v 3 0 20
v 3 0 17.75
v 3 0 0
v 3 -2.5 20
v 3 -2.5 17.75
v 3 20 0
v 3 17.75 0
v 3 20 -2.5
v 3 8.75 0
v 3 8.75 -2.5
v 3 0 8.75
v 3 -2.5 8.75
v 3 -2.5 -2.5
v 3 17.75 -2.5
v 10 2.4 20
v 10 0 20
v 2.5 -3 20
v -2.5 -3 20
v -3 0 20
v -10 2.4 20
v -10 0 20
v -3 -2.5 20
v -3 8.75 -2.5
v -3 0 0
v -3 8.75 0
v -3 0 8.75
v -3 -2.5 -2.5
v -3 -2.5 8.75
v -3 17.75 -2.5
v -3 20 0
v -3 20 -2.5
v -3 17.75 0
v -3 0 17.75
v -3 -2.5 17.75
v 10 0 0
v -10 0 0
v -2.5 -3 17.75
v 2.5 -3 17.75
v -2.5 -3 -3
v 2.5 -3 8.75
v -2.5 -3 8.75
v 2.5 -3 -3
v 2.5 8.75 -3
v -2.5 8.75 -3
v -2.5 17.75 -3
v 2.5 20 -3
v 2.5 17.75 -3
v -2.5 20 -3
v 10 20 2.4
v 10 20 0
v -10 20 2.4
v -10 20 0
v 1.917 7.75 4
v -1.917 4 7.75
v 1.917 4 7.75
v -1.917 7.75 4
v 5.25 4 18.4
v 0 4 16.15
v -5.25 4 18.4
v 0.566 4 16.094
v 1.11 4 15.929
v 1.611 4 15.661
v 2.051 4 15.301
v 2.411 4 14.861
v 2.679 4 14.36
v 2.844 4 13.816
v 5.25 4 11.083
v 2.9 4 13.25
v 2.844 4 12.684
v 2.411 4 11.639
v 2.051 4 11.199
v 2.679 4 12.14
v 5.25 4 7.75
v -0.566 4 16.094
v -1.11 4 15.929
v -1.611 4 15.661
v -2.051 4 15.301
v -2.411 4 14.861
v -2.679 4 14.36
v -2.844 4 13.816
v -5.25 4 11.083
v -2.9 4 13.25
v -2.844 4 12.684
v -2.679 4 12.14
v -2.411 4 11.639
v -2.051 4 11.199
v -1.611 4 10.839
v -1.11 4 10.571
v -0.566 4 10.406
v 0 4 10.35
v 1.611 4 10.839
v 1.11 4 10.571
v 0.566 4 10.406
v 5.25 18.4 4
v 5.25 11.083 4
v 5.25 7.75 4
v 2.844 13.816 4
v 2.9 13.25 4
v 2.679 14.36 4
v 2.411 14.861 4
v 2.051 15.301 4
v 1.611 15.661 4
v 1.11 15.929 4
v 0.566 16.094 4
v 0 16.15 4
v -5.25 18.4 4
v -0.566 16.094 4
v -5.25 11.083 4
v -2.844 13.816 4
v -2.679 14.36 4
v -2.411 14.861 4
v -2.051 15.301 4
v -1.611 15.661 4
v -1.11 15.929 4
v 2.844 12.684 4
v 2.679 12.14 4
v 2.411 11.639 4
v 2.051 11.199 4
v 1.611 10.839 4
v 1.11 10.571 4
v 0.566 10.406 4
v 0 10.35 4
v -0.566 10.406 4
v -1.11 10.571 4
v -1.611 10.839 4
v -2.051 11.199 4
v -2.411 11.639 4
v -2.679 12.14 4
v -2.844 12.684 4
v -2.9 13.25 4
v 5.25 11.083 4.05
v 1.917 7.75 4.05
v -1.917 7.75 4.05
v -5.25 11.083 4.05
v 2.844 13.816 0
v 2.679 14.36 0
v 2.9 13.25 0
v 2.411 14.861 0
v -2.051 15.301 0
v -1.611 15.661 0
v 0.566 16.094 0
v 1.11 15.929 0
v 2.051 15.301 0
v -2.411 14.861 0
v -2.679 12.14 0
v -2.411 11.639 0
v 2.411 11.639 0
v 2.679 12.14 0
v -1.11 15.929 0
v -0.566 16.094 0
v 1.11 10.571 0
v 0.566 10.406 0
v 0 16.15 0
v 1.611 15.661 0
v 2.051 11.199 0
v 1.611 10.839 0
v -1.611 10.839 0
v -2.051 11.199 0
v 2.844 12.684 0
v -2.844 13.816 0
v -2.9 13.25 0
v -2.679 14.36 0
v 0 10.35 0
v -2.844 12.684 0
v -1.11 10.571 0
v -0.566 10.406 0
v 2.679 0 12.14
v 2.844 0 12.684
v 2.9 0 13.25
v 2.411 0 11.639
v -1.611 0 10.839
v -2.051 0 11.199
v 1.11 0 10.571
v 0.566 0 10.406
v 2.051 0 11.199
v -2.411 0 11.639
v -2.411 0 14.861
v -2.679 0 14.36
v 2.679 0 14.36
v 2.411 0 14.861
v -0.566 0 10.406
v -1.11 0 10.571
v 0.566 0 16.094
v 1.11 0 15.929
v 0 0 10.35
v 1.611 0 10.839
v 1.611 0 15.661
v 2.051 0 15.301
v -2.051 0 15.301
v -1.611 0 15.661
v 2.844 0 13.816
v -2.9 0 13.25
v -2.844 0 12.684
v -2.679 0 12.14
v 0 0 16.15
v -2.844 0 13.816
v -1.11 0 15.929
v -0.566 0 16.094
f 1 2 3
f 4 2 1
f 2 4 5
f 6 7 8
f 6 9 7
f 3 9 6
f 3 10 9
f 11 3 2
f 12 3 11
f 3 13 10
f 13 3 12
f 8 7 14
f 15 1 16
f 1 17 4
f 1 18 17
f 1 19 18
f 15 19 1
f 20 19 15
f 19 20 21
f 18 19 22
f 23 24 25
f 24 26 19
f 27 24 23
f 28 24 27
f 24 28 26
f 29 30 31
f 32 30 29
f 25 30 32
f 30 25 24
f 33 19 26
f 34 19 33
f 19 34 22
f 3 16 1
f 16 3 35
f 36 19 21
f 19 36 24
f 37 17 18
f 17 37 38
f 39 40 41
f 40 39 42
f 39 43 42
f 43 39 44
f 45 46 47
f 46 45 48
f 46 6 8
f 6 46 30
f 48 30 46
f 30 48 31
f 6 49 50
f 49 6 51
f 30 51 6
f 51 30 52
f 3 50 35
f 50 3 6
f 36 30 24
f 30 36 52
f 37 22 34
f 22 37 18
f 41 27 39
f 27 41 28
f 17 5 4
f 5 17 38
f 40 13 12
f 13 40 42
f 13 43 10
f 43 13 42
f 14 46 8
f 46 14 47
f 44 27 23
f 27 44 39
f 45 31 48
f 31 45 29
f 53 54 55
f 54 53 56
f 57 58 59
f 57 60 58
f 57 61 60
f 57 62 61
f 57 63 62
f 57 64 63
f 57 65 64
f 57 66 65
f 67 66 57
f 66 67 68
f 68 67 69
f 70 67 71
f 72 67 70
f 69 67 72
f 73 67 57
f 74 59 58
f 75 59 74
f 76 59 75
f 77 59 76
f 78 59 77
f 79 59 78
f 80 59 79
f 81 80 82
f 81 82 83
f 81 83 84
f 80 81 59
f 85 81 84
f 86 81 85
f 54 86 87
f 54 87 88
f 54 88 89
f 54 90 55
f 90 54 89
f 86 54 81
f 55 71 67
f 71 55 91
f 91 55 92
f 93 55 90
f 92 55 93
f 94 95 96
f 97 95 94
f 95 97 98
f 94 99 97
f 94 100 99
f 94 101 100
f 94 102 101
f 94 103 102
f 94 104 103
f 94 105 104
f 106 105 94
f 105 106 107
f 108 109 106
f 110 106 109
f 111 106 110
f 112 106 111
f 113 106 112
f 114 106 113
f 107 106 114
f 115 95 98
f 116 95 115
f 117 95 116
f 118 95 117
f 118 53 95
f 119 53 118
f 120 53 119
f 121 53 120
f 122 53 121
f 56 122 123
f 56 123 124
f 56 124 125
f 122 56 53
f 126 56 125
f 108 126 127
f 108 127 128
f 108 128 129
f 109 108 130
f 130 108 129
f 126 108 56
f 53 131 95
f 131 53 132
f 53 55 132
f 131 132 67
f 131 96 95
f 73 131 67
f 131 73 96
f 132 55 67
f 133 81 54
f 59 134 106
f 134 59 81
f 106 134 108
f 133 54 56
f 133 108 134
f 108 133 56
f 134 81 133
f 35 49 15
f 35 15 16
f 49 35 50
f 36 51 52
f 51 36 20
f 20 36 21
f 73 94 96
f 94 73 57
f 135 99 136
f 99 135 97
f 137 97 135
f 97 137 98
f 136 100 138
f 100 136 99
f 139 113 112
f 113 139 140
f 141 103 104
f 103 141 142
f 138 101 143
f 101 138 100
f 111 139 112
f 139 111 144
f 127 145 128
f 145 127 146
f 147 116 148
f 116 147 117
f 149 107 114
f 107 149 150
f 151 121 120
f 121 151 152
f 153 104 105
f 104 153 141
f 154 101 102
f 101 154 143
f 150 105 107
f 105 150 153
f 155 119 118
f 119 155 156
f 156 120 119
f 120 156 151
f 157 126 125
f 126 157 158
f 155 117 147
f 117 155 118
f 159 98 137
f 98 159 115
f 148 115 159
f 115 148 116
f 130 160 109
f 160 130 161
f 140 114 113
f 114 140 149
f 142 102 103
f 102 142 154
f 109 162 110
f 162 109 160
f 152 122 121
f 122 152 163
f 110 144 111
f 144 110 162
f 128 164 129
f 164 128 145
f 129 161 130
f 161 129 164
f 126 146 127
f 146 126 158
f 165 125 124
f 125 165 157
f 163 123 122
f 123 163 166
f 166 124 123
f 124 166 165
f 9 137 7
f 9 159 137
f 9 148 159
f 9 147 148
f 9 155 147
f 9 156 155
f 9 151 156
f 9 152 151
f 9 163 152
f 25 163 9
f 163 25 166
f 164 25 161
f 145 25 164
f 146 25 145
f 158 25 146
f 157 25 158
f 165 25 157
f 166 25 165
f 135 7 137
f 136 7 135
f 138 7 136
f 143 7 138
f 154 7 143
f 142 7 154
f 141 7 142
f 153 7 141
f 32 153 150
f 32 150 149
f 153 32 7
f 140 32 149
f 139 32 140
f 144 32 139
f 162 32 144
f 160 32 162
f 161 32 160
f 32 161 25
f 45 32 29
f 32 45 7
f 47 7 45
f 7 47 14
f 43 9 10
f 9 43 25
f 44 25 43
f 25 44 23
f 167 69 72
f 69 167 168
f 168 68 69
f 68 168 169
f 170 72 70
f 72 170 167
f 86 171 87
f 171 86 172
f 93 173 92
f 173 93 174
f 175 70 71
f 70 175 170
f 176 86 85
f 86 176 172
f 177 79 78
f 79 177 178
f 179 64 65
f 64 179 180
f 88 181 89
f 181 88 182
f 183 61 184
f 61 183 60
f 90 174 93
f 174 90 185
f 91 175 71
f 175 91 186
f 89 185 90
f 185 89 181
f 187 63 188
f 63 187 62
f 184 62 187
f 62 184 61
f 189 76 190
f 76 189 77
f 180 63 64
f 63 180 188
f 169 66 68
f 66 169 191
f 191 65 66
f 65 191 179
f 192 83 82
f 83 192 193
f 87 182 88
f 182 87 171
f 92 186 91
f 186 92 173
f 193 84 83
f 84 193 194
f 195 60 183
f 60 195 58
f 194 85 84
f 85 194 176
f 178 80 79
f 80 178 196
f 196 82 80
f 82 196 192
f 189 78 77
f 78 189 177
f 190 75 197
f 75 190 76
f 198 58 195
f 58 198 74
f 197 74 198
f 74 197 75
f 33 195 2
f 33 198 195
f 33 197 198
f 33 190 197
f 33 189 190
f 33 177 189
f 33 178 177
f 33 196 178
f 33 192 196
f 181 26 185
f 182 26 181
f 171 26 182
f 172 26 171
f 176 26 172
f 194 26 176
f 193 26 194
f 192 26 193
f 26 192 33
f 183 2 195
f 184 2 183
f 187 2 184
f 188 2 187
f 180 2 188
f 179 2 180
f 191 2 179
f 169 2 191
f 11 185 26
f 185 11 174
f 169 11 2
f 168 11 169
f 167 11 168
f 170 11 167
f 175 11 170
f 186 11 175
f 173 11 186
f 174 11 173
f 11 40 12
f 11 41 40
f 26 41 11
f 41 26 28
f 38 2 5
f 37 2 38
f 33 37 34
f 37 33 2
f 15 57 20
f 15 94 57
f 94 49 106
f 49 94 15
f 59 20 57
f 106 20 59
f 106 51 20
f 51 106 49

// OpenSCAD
/*
* Ultimate Customizable Corner Brackets
* https://www.thingiverse.com/thing:3007147
* By Daniel Hultgren https://www.thingiverse.com/Hultis
* Version 1.21
* 2020-01-08
*/


// The width of your aluminium extrusion.
extrusion_width = 20;

// The side length of the bracket.
side_length = 20;
// The thickness of the wall facing the extrusion.
side_thickness = 4;

// How many screws should be used to fasten this to the extrusions. Should be even.
screw_count = 2;
// Screw diameter (4 for M4, 5 for M5 and so on).
screw_hole_size = 5;
// Screw head diameter.
screw_head_size = 10;
// How deep screw heads should be recessed. Obviously don't make this larger than side_thickness.
recessed_screw_depth = 0;

// The part which goes into your extrusion. Generally this should be slightly smaller than the actual hole, but YMMV.
extrusion_insert_width = 6;

// Use this when you want multiple connected brackets, for 4020 and similar. 20 for 2020 extrusions, 30 for 3030 and so on.
extrusion_base = 20;

// Set to true if you only want a single wall. Not compatible with multiple bracket mode.
single_wall_mode = 0; // [0: false, 1:true]

// Set lower if you think the side walls are too thick.
max_wall_thickness = 8;

// Set this if you want to use these above your existing brackets. Typical 2020 brackets have a size of 20 and side thickness of 3.
cutout_size = 0;
cutout_side_thickness = 3;

// Decrease this if you don't want extrusion inserts on both sides. Intended for using these entirely or partially on non-extrusions.
extrusion_insert_count = 2; // [0, 1, 2]





/**********************************
   End of config, here be dragons
**********************************/





/* [Hidden] */
// preview[view:north east, tilt:top diagonal]

// This works for typical hammer nuts, increase if needed
bottom_nut_space = screw_hole_size + 4;

// You might want to decrease this if you don't use hammer nuts
extrusion_insert_height = 3;

cutout_margin = 0.3;
screw_head_margin = 0.5;
e = 0.05;
screw_distance_from_edge = max(screw_head_size / 2 + 1.5, min(6.5, side_length/3)) + screw_head_margin/2;
bridge_size = screw_count > 2
    ? (side_length - side_thickness - 2*screw_head_size + cutout_size + cutout_margin) / (side_length/20)
    : side_length - screw_distance_from_edge - screw_head_size / 2 - side_thickness - screw_head_margin;

main();

module main() {
    bracket_count = floor(extrusion_width / extrusion_base);
    extrusion_width = extrusion_width/bracket_count;
    wall_thickness = min([max_wall_thickness, (extrusion_width - screw_head_size - screw_head_margin) / 2]);
    union() {
        for(i=[0:bracket_count-1]) {
            translate([i*extrusion_width, 0, 0]) bracket(extrusion_width, wall_thickness);
        }
    }
}

module bracket(width, wall_thickness, is_first) {
    screw_total_distance = side_length - screw_distance_from_edge - bridge_size - side_thickness - screw_head_size/2 - screw_head_margin;
    screw_distance = screw_total_distance/(max(1, screw_count/2-1));
    
    difference() {
        union() {
            translate([-width/2, 0, 0]) cube([width, side_length, side_thickness]); // Bottom wall
            translate([-width/2, side_thickness, 0]) rotate([90, 0, 0]) cube([width, side_length, side_thickness]); // Top wall
            translate([width/2 - wall_thickness, 0, 0]) rotate([90, 0, 90]) wall(width, side_length, wall_thickness); // Left wall
            if(!single_wall_mode) {
                translate([-width/2, 0, 0]) rotate([90, 0, 90]) wall(width, side_length, wall_thickness); // Right wall
            }
            
            // Make the parts which go into the extrusions, with chamfers
            if (extrusion_insert_count > 0) difference() {
                union() {
                    if (extrusion_insert_count > 1) {
                        extrusion_insert();
                        translate([-extrusion_insert_width/2, -extrusion_insert_height, -extrusion_insert_height]) cube([extrusion_insert_width, extrusion_insert_height, extrusion_insert_height]);
                    }
                    if(extrusion_insert_count > 0) {
                        translate([0, 0, 0]) rotate([90, 0, 180]) extrusion_insert();
                    }
                    
                }
                extrusion_chamfer();
                translate([0, 0, 0]) rotate([90, 0, 180]) extrusion_chamfer();
            }
            bridge(bridge_size, width, wall_thickness);
        };
        translate([-width/2 - e, side_length + side_thickness*0.6, 0]) rotate([45, 0, 0]) cube([width + e * 2, side_length, side_length*2]); // Cutoff for better printing
        
        // Make screw holes
        for(i=[0:screw_count/2-1]) {
            translate([0, side_length - screw_distance_from_edge - i*screw_distance, -e]) screw(screw_hole_size, screw_head_size); // Bottom screw
            translate([0, -e, side_length - screw_distance_from_edge - i*screw_distance]) rotate([270, 0, 0]) screw(screw_hole_size, screw_head_size); // Top screw
        }
        cutout();
    }
}

module cutout() {
    zero = -e-extrusion_insert_height;
    full_width = cutout_size+cutout_margin;
    if (cutout_size > 0) translate([extrusion_width/2+e, 0, 0]) rotate([0, -90, 0]) linear_extrude(height = extrusion_width+2*e, convexity = 2) polygon(points = [
        [zero, zero],
        [zero, full_width],
        [cutout_side_thickness+cutout_margin, full_width],
        [full_width, cutout_side_thickness+cutout_margin],
        [full_width, zero]]);
}

module wall(w, l, wall_thickness) {
    linear_extrude(height = wall_thickness, convexity = 2) polygon(points = [[side_thickness, side_thickness], [side_length, side_thickness], [side_thickness, side_length]]);
}

module screw(hole_size, head_size) {
    translate([0,0,-0.5]) cylinder(h = side_thickness + 1, r = hole_size / 2 + 0.4, $fn = 32); // Screw hole
    if(recessed_screw_depth > 0){
        translate([0, 0, side_thickness - recessed_screw_depth]) cylinder(h = recessed_screw_depth+1, r = (head_size + screw_head_margin)/2, $fn = 32);
    }
    translate([-extrusion_insert_width/2-e, -bottom_nut_space/2, -extrusion_insert_height-e]) cube([extrusion_insert_width + 2*e, bottom_nut_space,extrusion_insert_height+2*e]); // Remove extrusion insert below screw
    #translate([0, 0, side_thickness+2*e]) cylinder(h = 3, r = head_size / 2, $fn = 32); // Screw head, to make sure they don't hit each other
}

module bridge(size, width, wall_thickness) {
    right = width - 2*wall_thickness + 2;
    c = screw_head_size / 3;
    top = size + c;
    x = width/2-wall_thickness-c;
    union() {
        translate([width/2 - e, 0, 0])
            rotate([0, 270, 0])
            linear_extrude(height = width - 2*e, convexity = 2)
            polygon([[side_thickness, side_thickness], [side_thickness + size, side_thickness], [side_thickness, side_thickness + size]]); // Main bridge
        translate([width/2-wall_thickness-c, 0, 0])
            bridge_side(size, [[0, 0], [c, 0], [c, c]]); // Left
        if(!single_wall_mode) {
            translate([-width/2+wall_thickness, 0, 0])
                bridge_side(size, [[0, 0], [c, 0], [0, c]]); // Right
        }
    }
}

module bridge_side(size, polygon_points){
    hull() {
        translate([0, size+side_thickness, side_thickness]) linear_extrude(height = e, convexity = 2) polygon(points = polygon_points);
        translate([0, side_thickness, size+side_thickness]) rotate([90,0,0]) linear_extrude(height = e, convexity = 2) polygon(points = polygon_points);
    }
}

module extrusion_insert() {
    translate([-extrusion_insert_width/2, -extrusion_insert_height, 0]) cube([extrusion_insert_width, extrusion_insert_height, side_length]);
}

module extrusion_chamfer(height = .5) {
    x = extrusion_insert_width;
    z = side_length + extrusion_insert_height;
    length = sqrt(height * height * 2);
    translate([-extrusion_insert_width/2, -extrusion_insert_height, -extrusion_insert_height]) union() {
        translate([0, -height, -e]) rotate([0, 0, 45]) cube([length, length, z+2*e]);
        translate([x, -height, -e]) rotate([0, 0, 45]) cube([length, length, z+2*e]);
    }
}
